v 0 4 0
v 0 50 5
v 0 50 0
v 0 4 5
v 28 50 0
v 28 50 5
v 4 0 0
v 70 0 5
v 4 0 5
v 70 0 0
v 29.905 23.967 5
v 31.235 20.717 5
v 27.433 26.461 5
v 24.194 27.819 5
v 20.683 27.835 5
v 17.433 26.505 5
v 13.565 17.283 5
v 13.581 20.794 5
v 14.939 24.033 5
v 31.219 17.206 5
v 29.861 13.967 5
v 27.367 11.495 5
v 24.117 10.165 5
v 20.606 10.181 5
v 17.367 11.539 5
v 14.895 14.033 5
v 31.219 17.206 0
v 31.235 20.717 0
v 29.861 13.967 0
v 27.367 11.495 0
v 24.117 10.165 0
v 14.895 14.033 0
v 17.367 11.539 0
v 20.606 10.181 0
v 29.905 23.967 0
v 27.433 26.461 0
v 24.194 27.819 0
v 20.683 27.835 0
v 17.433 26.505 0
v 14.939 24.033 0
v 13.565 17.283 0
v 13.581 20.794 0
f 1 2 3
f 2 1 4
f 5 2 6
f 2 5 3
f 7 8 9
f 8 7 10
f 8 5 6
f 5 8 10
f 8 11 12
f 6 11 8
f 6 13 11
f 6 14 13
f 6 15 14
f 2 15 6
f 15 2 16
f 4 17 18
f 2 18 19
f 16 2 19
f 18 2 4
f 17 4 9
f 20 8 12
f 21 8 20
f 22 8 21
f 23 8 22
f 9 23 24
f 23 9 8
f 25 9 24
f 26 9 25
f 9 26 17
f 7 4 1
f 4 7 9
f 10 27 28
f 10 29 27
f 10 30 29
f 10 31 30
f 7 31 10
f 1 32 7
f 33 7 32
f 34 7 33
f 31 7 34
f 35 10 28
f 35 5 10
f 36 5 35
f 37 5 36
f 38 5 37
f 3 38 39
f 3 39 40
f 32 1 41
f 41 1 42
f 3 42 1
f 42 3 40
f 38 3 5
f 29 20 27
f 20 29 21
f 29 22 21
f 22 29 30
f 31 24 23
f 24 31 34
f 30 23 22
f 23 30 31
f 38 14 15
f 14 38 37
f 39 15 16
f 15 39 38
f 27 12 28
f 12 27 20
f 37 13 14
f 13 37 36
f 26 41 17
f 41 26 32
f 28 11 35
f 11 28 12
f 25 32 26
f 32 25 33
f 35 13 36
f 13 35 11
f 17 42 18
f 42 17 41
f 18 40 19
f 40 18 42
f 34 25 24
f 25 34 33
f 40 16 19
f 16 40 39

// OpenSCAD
$fn = 32;

// ----------------------------------------------------------------------
// Bracket plate: gusset 70 x 50
// ----------------------------------------------------------------------

// --- parameters (mm) ---
hole_r = 3.5;             // bolt hole radius
plate_t = 5;              // plate thickness, Z (extrusion height)
gus_a = 70;               // base length
gus_b = 50;               // height
top_x = 28;               // top edge X of the angled cut
light_r = 9;              // lightening hole radius

light_d = 2 * light_r;

profile = [[4, 0], [35, 0], [70, 0], [28, 50], [0, 50], [0, 4]];  // primary outline, 6 points, counter clockwise
void_1 = [[31.235, 20.717], [29.905, 23.967], [27.433, 26.461], [24.194, 27.819], [20.683, 27.835], [17.433, 26.505], [14.939, 24.033], [13.581, 20.794], [13.565, 17.283], [14.895, 14.033], [17.367, 11.539], [20.606, 10.181], [24.117, 10.165], [27.367, 11.495], [29.861, 13.967], [31.219, 17.206]];  // lightening hole, 16 points

// --- the one profile operation ---
difference() {
  linear_extrude(height = plate_t) polygon(points = profile);
  translate([0, 0, -1])
    linear_extrude(height = plate_t + 2) polygon(points = void_1);
}
